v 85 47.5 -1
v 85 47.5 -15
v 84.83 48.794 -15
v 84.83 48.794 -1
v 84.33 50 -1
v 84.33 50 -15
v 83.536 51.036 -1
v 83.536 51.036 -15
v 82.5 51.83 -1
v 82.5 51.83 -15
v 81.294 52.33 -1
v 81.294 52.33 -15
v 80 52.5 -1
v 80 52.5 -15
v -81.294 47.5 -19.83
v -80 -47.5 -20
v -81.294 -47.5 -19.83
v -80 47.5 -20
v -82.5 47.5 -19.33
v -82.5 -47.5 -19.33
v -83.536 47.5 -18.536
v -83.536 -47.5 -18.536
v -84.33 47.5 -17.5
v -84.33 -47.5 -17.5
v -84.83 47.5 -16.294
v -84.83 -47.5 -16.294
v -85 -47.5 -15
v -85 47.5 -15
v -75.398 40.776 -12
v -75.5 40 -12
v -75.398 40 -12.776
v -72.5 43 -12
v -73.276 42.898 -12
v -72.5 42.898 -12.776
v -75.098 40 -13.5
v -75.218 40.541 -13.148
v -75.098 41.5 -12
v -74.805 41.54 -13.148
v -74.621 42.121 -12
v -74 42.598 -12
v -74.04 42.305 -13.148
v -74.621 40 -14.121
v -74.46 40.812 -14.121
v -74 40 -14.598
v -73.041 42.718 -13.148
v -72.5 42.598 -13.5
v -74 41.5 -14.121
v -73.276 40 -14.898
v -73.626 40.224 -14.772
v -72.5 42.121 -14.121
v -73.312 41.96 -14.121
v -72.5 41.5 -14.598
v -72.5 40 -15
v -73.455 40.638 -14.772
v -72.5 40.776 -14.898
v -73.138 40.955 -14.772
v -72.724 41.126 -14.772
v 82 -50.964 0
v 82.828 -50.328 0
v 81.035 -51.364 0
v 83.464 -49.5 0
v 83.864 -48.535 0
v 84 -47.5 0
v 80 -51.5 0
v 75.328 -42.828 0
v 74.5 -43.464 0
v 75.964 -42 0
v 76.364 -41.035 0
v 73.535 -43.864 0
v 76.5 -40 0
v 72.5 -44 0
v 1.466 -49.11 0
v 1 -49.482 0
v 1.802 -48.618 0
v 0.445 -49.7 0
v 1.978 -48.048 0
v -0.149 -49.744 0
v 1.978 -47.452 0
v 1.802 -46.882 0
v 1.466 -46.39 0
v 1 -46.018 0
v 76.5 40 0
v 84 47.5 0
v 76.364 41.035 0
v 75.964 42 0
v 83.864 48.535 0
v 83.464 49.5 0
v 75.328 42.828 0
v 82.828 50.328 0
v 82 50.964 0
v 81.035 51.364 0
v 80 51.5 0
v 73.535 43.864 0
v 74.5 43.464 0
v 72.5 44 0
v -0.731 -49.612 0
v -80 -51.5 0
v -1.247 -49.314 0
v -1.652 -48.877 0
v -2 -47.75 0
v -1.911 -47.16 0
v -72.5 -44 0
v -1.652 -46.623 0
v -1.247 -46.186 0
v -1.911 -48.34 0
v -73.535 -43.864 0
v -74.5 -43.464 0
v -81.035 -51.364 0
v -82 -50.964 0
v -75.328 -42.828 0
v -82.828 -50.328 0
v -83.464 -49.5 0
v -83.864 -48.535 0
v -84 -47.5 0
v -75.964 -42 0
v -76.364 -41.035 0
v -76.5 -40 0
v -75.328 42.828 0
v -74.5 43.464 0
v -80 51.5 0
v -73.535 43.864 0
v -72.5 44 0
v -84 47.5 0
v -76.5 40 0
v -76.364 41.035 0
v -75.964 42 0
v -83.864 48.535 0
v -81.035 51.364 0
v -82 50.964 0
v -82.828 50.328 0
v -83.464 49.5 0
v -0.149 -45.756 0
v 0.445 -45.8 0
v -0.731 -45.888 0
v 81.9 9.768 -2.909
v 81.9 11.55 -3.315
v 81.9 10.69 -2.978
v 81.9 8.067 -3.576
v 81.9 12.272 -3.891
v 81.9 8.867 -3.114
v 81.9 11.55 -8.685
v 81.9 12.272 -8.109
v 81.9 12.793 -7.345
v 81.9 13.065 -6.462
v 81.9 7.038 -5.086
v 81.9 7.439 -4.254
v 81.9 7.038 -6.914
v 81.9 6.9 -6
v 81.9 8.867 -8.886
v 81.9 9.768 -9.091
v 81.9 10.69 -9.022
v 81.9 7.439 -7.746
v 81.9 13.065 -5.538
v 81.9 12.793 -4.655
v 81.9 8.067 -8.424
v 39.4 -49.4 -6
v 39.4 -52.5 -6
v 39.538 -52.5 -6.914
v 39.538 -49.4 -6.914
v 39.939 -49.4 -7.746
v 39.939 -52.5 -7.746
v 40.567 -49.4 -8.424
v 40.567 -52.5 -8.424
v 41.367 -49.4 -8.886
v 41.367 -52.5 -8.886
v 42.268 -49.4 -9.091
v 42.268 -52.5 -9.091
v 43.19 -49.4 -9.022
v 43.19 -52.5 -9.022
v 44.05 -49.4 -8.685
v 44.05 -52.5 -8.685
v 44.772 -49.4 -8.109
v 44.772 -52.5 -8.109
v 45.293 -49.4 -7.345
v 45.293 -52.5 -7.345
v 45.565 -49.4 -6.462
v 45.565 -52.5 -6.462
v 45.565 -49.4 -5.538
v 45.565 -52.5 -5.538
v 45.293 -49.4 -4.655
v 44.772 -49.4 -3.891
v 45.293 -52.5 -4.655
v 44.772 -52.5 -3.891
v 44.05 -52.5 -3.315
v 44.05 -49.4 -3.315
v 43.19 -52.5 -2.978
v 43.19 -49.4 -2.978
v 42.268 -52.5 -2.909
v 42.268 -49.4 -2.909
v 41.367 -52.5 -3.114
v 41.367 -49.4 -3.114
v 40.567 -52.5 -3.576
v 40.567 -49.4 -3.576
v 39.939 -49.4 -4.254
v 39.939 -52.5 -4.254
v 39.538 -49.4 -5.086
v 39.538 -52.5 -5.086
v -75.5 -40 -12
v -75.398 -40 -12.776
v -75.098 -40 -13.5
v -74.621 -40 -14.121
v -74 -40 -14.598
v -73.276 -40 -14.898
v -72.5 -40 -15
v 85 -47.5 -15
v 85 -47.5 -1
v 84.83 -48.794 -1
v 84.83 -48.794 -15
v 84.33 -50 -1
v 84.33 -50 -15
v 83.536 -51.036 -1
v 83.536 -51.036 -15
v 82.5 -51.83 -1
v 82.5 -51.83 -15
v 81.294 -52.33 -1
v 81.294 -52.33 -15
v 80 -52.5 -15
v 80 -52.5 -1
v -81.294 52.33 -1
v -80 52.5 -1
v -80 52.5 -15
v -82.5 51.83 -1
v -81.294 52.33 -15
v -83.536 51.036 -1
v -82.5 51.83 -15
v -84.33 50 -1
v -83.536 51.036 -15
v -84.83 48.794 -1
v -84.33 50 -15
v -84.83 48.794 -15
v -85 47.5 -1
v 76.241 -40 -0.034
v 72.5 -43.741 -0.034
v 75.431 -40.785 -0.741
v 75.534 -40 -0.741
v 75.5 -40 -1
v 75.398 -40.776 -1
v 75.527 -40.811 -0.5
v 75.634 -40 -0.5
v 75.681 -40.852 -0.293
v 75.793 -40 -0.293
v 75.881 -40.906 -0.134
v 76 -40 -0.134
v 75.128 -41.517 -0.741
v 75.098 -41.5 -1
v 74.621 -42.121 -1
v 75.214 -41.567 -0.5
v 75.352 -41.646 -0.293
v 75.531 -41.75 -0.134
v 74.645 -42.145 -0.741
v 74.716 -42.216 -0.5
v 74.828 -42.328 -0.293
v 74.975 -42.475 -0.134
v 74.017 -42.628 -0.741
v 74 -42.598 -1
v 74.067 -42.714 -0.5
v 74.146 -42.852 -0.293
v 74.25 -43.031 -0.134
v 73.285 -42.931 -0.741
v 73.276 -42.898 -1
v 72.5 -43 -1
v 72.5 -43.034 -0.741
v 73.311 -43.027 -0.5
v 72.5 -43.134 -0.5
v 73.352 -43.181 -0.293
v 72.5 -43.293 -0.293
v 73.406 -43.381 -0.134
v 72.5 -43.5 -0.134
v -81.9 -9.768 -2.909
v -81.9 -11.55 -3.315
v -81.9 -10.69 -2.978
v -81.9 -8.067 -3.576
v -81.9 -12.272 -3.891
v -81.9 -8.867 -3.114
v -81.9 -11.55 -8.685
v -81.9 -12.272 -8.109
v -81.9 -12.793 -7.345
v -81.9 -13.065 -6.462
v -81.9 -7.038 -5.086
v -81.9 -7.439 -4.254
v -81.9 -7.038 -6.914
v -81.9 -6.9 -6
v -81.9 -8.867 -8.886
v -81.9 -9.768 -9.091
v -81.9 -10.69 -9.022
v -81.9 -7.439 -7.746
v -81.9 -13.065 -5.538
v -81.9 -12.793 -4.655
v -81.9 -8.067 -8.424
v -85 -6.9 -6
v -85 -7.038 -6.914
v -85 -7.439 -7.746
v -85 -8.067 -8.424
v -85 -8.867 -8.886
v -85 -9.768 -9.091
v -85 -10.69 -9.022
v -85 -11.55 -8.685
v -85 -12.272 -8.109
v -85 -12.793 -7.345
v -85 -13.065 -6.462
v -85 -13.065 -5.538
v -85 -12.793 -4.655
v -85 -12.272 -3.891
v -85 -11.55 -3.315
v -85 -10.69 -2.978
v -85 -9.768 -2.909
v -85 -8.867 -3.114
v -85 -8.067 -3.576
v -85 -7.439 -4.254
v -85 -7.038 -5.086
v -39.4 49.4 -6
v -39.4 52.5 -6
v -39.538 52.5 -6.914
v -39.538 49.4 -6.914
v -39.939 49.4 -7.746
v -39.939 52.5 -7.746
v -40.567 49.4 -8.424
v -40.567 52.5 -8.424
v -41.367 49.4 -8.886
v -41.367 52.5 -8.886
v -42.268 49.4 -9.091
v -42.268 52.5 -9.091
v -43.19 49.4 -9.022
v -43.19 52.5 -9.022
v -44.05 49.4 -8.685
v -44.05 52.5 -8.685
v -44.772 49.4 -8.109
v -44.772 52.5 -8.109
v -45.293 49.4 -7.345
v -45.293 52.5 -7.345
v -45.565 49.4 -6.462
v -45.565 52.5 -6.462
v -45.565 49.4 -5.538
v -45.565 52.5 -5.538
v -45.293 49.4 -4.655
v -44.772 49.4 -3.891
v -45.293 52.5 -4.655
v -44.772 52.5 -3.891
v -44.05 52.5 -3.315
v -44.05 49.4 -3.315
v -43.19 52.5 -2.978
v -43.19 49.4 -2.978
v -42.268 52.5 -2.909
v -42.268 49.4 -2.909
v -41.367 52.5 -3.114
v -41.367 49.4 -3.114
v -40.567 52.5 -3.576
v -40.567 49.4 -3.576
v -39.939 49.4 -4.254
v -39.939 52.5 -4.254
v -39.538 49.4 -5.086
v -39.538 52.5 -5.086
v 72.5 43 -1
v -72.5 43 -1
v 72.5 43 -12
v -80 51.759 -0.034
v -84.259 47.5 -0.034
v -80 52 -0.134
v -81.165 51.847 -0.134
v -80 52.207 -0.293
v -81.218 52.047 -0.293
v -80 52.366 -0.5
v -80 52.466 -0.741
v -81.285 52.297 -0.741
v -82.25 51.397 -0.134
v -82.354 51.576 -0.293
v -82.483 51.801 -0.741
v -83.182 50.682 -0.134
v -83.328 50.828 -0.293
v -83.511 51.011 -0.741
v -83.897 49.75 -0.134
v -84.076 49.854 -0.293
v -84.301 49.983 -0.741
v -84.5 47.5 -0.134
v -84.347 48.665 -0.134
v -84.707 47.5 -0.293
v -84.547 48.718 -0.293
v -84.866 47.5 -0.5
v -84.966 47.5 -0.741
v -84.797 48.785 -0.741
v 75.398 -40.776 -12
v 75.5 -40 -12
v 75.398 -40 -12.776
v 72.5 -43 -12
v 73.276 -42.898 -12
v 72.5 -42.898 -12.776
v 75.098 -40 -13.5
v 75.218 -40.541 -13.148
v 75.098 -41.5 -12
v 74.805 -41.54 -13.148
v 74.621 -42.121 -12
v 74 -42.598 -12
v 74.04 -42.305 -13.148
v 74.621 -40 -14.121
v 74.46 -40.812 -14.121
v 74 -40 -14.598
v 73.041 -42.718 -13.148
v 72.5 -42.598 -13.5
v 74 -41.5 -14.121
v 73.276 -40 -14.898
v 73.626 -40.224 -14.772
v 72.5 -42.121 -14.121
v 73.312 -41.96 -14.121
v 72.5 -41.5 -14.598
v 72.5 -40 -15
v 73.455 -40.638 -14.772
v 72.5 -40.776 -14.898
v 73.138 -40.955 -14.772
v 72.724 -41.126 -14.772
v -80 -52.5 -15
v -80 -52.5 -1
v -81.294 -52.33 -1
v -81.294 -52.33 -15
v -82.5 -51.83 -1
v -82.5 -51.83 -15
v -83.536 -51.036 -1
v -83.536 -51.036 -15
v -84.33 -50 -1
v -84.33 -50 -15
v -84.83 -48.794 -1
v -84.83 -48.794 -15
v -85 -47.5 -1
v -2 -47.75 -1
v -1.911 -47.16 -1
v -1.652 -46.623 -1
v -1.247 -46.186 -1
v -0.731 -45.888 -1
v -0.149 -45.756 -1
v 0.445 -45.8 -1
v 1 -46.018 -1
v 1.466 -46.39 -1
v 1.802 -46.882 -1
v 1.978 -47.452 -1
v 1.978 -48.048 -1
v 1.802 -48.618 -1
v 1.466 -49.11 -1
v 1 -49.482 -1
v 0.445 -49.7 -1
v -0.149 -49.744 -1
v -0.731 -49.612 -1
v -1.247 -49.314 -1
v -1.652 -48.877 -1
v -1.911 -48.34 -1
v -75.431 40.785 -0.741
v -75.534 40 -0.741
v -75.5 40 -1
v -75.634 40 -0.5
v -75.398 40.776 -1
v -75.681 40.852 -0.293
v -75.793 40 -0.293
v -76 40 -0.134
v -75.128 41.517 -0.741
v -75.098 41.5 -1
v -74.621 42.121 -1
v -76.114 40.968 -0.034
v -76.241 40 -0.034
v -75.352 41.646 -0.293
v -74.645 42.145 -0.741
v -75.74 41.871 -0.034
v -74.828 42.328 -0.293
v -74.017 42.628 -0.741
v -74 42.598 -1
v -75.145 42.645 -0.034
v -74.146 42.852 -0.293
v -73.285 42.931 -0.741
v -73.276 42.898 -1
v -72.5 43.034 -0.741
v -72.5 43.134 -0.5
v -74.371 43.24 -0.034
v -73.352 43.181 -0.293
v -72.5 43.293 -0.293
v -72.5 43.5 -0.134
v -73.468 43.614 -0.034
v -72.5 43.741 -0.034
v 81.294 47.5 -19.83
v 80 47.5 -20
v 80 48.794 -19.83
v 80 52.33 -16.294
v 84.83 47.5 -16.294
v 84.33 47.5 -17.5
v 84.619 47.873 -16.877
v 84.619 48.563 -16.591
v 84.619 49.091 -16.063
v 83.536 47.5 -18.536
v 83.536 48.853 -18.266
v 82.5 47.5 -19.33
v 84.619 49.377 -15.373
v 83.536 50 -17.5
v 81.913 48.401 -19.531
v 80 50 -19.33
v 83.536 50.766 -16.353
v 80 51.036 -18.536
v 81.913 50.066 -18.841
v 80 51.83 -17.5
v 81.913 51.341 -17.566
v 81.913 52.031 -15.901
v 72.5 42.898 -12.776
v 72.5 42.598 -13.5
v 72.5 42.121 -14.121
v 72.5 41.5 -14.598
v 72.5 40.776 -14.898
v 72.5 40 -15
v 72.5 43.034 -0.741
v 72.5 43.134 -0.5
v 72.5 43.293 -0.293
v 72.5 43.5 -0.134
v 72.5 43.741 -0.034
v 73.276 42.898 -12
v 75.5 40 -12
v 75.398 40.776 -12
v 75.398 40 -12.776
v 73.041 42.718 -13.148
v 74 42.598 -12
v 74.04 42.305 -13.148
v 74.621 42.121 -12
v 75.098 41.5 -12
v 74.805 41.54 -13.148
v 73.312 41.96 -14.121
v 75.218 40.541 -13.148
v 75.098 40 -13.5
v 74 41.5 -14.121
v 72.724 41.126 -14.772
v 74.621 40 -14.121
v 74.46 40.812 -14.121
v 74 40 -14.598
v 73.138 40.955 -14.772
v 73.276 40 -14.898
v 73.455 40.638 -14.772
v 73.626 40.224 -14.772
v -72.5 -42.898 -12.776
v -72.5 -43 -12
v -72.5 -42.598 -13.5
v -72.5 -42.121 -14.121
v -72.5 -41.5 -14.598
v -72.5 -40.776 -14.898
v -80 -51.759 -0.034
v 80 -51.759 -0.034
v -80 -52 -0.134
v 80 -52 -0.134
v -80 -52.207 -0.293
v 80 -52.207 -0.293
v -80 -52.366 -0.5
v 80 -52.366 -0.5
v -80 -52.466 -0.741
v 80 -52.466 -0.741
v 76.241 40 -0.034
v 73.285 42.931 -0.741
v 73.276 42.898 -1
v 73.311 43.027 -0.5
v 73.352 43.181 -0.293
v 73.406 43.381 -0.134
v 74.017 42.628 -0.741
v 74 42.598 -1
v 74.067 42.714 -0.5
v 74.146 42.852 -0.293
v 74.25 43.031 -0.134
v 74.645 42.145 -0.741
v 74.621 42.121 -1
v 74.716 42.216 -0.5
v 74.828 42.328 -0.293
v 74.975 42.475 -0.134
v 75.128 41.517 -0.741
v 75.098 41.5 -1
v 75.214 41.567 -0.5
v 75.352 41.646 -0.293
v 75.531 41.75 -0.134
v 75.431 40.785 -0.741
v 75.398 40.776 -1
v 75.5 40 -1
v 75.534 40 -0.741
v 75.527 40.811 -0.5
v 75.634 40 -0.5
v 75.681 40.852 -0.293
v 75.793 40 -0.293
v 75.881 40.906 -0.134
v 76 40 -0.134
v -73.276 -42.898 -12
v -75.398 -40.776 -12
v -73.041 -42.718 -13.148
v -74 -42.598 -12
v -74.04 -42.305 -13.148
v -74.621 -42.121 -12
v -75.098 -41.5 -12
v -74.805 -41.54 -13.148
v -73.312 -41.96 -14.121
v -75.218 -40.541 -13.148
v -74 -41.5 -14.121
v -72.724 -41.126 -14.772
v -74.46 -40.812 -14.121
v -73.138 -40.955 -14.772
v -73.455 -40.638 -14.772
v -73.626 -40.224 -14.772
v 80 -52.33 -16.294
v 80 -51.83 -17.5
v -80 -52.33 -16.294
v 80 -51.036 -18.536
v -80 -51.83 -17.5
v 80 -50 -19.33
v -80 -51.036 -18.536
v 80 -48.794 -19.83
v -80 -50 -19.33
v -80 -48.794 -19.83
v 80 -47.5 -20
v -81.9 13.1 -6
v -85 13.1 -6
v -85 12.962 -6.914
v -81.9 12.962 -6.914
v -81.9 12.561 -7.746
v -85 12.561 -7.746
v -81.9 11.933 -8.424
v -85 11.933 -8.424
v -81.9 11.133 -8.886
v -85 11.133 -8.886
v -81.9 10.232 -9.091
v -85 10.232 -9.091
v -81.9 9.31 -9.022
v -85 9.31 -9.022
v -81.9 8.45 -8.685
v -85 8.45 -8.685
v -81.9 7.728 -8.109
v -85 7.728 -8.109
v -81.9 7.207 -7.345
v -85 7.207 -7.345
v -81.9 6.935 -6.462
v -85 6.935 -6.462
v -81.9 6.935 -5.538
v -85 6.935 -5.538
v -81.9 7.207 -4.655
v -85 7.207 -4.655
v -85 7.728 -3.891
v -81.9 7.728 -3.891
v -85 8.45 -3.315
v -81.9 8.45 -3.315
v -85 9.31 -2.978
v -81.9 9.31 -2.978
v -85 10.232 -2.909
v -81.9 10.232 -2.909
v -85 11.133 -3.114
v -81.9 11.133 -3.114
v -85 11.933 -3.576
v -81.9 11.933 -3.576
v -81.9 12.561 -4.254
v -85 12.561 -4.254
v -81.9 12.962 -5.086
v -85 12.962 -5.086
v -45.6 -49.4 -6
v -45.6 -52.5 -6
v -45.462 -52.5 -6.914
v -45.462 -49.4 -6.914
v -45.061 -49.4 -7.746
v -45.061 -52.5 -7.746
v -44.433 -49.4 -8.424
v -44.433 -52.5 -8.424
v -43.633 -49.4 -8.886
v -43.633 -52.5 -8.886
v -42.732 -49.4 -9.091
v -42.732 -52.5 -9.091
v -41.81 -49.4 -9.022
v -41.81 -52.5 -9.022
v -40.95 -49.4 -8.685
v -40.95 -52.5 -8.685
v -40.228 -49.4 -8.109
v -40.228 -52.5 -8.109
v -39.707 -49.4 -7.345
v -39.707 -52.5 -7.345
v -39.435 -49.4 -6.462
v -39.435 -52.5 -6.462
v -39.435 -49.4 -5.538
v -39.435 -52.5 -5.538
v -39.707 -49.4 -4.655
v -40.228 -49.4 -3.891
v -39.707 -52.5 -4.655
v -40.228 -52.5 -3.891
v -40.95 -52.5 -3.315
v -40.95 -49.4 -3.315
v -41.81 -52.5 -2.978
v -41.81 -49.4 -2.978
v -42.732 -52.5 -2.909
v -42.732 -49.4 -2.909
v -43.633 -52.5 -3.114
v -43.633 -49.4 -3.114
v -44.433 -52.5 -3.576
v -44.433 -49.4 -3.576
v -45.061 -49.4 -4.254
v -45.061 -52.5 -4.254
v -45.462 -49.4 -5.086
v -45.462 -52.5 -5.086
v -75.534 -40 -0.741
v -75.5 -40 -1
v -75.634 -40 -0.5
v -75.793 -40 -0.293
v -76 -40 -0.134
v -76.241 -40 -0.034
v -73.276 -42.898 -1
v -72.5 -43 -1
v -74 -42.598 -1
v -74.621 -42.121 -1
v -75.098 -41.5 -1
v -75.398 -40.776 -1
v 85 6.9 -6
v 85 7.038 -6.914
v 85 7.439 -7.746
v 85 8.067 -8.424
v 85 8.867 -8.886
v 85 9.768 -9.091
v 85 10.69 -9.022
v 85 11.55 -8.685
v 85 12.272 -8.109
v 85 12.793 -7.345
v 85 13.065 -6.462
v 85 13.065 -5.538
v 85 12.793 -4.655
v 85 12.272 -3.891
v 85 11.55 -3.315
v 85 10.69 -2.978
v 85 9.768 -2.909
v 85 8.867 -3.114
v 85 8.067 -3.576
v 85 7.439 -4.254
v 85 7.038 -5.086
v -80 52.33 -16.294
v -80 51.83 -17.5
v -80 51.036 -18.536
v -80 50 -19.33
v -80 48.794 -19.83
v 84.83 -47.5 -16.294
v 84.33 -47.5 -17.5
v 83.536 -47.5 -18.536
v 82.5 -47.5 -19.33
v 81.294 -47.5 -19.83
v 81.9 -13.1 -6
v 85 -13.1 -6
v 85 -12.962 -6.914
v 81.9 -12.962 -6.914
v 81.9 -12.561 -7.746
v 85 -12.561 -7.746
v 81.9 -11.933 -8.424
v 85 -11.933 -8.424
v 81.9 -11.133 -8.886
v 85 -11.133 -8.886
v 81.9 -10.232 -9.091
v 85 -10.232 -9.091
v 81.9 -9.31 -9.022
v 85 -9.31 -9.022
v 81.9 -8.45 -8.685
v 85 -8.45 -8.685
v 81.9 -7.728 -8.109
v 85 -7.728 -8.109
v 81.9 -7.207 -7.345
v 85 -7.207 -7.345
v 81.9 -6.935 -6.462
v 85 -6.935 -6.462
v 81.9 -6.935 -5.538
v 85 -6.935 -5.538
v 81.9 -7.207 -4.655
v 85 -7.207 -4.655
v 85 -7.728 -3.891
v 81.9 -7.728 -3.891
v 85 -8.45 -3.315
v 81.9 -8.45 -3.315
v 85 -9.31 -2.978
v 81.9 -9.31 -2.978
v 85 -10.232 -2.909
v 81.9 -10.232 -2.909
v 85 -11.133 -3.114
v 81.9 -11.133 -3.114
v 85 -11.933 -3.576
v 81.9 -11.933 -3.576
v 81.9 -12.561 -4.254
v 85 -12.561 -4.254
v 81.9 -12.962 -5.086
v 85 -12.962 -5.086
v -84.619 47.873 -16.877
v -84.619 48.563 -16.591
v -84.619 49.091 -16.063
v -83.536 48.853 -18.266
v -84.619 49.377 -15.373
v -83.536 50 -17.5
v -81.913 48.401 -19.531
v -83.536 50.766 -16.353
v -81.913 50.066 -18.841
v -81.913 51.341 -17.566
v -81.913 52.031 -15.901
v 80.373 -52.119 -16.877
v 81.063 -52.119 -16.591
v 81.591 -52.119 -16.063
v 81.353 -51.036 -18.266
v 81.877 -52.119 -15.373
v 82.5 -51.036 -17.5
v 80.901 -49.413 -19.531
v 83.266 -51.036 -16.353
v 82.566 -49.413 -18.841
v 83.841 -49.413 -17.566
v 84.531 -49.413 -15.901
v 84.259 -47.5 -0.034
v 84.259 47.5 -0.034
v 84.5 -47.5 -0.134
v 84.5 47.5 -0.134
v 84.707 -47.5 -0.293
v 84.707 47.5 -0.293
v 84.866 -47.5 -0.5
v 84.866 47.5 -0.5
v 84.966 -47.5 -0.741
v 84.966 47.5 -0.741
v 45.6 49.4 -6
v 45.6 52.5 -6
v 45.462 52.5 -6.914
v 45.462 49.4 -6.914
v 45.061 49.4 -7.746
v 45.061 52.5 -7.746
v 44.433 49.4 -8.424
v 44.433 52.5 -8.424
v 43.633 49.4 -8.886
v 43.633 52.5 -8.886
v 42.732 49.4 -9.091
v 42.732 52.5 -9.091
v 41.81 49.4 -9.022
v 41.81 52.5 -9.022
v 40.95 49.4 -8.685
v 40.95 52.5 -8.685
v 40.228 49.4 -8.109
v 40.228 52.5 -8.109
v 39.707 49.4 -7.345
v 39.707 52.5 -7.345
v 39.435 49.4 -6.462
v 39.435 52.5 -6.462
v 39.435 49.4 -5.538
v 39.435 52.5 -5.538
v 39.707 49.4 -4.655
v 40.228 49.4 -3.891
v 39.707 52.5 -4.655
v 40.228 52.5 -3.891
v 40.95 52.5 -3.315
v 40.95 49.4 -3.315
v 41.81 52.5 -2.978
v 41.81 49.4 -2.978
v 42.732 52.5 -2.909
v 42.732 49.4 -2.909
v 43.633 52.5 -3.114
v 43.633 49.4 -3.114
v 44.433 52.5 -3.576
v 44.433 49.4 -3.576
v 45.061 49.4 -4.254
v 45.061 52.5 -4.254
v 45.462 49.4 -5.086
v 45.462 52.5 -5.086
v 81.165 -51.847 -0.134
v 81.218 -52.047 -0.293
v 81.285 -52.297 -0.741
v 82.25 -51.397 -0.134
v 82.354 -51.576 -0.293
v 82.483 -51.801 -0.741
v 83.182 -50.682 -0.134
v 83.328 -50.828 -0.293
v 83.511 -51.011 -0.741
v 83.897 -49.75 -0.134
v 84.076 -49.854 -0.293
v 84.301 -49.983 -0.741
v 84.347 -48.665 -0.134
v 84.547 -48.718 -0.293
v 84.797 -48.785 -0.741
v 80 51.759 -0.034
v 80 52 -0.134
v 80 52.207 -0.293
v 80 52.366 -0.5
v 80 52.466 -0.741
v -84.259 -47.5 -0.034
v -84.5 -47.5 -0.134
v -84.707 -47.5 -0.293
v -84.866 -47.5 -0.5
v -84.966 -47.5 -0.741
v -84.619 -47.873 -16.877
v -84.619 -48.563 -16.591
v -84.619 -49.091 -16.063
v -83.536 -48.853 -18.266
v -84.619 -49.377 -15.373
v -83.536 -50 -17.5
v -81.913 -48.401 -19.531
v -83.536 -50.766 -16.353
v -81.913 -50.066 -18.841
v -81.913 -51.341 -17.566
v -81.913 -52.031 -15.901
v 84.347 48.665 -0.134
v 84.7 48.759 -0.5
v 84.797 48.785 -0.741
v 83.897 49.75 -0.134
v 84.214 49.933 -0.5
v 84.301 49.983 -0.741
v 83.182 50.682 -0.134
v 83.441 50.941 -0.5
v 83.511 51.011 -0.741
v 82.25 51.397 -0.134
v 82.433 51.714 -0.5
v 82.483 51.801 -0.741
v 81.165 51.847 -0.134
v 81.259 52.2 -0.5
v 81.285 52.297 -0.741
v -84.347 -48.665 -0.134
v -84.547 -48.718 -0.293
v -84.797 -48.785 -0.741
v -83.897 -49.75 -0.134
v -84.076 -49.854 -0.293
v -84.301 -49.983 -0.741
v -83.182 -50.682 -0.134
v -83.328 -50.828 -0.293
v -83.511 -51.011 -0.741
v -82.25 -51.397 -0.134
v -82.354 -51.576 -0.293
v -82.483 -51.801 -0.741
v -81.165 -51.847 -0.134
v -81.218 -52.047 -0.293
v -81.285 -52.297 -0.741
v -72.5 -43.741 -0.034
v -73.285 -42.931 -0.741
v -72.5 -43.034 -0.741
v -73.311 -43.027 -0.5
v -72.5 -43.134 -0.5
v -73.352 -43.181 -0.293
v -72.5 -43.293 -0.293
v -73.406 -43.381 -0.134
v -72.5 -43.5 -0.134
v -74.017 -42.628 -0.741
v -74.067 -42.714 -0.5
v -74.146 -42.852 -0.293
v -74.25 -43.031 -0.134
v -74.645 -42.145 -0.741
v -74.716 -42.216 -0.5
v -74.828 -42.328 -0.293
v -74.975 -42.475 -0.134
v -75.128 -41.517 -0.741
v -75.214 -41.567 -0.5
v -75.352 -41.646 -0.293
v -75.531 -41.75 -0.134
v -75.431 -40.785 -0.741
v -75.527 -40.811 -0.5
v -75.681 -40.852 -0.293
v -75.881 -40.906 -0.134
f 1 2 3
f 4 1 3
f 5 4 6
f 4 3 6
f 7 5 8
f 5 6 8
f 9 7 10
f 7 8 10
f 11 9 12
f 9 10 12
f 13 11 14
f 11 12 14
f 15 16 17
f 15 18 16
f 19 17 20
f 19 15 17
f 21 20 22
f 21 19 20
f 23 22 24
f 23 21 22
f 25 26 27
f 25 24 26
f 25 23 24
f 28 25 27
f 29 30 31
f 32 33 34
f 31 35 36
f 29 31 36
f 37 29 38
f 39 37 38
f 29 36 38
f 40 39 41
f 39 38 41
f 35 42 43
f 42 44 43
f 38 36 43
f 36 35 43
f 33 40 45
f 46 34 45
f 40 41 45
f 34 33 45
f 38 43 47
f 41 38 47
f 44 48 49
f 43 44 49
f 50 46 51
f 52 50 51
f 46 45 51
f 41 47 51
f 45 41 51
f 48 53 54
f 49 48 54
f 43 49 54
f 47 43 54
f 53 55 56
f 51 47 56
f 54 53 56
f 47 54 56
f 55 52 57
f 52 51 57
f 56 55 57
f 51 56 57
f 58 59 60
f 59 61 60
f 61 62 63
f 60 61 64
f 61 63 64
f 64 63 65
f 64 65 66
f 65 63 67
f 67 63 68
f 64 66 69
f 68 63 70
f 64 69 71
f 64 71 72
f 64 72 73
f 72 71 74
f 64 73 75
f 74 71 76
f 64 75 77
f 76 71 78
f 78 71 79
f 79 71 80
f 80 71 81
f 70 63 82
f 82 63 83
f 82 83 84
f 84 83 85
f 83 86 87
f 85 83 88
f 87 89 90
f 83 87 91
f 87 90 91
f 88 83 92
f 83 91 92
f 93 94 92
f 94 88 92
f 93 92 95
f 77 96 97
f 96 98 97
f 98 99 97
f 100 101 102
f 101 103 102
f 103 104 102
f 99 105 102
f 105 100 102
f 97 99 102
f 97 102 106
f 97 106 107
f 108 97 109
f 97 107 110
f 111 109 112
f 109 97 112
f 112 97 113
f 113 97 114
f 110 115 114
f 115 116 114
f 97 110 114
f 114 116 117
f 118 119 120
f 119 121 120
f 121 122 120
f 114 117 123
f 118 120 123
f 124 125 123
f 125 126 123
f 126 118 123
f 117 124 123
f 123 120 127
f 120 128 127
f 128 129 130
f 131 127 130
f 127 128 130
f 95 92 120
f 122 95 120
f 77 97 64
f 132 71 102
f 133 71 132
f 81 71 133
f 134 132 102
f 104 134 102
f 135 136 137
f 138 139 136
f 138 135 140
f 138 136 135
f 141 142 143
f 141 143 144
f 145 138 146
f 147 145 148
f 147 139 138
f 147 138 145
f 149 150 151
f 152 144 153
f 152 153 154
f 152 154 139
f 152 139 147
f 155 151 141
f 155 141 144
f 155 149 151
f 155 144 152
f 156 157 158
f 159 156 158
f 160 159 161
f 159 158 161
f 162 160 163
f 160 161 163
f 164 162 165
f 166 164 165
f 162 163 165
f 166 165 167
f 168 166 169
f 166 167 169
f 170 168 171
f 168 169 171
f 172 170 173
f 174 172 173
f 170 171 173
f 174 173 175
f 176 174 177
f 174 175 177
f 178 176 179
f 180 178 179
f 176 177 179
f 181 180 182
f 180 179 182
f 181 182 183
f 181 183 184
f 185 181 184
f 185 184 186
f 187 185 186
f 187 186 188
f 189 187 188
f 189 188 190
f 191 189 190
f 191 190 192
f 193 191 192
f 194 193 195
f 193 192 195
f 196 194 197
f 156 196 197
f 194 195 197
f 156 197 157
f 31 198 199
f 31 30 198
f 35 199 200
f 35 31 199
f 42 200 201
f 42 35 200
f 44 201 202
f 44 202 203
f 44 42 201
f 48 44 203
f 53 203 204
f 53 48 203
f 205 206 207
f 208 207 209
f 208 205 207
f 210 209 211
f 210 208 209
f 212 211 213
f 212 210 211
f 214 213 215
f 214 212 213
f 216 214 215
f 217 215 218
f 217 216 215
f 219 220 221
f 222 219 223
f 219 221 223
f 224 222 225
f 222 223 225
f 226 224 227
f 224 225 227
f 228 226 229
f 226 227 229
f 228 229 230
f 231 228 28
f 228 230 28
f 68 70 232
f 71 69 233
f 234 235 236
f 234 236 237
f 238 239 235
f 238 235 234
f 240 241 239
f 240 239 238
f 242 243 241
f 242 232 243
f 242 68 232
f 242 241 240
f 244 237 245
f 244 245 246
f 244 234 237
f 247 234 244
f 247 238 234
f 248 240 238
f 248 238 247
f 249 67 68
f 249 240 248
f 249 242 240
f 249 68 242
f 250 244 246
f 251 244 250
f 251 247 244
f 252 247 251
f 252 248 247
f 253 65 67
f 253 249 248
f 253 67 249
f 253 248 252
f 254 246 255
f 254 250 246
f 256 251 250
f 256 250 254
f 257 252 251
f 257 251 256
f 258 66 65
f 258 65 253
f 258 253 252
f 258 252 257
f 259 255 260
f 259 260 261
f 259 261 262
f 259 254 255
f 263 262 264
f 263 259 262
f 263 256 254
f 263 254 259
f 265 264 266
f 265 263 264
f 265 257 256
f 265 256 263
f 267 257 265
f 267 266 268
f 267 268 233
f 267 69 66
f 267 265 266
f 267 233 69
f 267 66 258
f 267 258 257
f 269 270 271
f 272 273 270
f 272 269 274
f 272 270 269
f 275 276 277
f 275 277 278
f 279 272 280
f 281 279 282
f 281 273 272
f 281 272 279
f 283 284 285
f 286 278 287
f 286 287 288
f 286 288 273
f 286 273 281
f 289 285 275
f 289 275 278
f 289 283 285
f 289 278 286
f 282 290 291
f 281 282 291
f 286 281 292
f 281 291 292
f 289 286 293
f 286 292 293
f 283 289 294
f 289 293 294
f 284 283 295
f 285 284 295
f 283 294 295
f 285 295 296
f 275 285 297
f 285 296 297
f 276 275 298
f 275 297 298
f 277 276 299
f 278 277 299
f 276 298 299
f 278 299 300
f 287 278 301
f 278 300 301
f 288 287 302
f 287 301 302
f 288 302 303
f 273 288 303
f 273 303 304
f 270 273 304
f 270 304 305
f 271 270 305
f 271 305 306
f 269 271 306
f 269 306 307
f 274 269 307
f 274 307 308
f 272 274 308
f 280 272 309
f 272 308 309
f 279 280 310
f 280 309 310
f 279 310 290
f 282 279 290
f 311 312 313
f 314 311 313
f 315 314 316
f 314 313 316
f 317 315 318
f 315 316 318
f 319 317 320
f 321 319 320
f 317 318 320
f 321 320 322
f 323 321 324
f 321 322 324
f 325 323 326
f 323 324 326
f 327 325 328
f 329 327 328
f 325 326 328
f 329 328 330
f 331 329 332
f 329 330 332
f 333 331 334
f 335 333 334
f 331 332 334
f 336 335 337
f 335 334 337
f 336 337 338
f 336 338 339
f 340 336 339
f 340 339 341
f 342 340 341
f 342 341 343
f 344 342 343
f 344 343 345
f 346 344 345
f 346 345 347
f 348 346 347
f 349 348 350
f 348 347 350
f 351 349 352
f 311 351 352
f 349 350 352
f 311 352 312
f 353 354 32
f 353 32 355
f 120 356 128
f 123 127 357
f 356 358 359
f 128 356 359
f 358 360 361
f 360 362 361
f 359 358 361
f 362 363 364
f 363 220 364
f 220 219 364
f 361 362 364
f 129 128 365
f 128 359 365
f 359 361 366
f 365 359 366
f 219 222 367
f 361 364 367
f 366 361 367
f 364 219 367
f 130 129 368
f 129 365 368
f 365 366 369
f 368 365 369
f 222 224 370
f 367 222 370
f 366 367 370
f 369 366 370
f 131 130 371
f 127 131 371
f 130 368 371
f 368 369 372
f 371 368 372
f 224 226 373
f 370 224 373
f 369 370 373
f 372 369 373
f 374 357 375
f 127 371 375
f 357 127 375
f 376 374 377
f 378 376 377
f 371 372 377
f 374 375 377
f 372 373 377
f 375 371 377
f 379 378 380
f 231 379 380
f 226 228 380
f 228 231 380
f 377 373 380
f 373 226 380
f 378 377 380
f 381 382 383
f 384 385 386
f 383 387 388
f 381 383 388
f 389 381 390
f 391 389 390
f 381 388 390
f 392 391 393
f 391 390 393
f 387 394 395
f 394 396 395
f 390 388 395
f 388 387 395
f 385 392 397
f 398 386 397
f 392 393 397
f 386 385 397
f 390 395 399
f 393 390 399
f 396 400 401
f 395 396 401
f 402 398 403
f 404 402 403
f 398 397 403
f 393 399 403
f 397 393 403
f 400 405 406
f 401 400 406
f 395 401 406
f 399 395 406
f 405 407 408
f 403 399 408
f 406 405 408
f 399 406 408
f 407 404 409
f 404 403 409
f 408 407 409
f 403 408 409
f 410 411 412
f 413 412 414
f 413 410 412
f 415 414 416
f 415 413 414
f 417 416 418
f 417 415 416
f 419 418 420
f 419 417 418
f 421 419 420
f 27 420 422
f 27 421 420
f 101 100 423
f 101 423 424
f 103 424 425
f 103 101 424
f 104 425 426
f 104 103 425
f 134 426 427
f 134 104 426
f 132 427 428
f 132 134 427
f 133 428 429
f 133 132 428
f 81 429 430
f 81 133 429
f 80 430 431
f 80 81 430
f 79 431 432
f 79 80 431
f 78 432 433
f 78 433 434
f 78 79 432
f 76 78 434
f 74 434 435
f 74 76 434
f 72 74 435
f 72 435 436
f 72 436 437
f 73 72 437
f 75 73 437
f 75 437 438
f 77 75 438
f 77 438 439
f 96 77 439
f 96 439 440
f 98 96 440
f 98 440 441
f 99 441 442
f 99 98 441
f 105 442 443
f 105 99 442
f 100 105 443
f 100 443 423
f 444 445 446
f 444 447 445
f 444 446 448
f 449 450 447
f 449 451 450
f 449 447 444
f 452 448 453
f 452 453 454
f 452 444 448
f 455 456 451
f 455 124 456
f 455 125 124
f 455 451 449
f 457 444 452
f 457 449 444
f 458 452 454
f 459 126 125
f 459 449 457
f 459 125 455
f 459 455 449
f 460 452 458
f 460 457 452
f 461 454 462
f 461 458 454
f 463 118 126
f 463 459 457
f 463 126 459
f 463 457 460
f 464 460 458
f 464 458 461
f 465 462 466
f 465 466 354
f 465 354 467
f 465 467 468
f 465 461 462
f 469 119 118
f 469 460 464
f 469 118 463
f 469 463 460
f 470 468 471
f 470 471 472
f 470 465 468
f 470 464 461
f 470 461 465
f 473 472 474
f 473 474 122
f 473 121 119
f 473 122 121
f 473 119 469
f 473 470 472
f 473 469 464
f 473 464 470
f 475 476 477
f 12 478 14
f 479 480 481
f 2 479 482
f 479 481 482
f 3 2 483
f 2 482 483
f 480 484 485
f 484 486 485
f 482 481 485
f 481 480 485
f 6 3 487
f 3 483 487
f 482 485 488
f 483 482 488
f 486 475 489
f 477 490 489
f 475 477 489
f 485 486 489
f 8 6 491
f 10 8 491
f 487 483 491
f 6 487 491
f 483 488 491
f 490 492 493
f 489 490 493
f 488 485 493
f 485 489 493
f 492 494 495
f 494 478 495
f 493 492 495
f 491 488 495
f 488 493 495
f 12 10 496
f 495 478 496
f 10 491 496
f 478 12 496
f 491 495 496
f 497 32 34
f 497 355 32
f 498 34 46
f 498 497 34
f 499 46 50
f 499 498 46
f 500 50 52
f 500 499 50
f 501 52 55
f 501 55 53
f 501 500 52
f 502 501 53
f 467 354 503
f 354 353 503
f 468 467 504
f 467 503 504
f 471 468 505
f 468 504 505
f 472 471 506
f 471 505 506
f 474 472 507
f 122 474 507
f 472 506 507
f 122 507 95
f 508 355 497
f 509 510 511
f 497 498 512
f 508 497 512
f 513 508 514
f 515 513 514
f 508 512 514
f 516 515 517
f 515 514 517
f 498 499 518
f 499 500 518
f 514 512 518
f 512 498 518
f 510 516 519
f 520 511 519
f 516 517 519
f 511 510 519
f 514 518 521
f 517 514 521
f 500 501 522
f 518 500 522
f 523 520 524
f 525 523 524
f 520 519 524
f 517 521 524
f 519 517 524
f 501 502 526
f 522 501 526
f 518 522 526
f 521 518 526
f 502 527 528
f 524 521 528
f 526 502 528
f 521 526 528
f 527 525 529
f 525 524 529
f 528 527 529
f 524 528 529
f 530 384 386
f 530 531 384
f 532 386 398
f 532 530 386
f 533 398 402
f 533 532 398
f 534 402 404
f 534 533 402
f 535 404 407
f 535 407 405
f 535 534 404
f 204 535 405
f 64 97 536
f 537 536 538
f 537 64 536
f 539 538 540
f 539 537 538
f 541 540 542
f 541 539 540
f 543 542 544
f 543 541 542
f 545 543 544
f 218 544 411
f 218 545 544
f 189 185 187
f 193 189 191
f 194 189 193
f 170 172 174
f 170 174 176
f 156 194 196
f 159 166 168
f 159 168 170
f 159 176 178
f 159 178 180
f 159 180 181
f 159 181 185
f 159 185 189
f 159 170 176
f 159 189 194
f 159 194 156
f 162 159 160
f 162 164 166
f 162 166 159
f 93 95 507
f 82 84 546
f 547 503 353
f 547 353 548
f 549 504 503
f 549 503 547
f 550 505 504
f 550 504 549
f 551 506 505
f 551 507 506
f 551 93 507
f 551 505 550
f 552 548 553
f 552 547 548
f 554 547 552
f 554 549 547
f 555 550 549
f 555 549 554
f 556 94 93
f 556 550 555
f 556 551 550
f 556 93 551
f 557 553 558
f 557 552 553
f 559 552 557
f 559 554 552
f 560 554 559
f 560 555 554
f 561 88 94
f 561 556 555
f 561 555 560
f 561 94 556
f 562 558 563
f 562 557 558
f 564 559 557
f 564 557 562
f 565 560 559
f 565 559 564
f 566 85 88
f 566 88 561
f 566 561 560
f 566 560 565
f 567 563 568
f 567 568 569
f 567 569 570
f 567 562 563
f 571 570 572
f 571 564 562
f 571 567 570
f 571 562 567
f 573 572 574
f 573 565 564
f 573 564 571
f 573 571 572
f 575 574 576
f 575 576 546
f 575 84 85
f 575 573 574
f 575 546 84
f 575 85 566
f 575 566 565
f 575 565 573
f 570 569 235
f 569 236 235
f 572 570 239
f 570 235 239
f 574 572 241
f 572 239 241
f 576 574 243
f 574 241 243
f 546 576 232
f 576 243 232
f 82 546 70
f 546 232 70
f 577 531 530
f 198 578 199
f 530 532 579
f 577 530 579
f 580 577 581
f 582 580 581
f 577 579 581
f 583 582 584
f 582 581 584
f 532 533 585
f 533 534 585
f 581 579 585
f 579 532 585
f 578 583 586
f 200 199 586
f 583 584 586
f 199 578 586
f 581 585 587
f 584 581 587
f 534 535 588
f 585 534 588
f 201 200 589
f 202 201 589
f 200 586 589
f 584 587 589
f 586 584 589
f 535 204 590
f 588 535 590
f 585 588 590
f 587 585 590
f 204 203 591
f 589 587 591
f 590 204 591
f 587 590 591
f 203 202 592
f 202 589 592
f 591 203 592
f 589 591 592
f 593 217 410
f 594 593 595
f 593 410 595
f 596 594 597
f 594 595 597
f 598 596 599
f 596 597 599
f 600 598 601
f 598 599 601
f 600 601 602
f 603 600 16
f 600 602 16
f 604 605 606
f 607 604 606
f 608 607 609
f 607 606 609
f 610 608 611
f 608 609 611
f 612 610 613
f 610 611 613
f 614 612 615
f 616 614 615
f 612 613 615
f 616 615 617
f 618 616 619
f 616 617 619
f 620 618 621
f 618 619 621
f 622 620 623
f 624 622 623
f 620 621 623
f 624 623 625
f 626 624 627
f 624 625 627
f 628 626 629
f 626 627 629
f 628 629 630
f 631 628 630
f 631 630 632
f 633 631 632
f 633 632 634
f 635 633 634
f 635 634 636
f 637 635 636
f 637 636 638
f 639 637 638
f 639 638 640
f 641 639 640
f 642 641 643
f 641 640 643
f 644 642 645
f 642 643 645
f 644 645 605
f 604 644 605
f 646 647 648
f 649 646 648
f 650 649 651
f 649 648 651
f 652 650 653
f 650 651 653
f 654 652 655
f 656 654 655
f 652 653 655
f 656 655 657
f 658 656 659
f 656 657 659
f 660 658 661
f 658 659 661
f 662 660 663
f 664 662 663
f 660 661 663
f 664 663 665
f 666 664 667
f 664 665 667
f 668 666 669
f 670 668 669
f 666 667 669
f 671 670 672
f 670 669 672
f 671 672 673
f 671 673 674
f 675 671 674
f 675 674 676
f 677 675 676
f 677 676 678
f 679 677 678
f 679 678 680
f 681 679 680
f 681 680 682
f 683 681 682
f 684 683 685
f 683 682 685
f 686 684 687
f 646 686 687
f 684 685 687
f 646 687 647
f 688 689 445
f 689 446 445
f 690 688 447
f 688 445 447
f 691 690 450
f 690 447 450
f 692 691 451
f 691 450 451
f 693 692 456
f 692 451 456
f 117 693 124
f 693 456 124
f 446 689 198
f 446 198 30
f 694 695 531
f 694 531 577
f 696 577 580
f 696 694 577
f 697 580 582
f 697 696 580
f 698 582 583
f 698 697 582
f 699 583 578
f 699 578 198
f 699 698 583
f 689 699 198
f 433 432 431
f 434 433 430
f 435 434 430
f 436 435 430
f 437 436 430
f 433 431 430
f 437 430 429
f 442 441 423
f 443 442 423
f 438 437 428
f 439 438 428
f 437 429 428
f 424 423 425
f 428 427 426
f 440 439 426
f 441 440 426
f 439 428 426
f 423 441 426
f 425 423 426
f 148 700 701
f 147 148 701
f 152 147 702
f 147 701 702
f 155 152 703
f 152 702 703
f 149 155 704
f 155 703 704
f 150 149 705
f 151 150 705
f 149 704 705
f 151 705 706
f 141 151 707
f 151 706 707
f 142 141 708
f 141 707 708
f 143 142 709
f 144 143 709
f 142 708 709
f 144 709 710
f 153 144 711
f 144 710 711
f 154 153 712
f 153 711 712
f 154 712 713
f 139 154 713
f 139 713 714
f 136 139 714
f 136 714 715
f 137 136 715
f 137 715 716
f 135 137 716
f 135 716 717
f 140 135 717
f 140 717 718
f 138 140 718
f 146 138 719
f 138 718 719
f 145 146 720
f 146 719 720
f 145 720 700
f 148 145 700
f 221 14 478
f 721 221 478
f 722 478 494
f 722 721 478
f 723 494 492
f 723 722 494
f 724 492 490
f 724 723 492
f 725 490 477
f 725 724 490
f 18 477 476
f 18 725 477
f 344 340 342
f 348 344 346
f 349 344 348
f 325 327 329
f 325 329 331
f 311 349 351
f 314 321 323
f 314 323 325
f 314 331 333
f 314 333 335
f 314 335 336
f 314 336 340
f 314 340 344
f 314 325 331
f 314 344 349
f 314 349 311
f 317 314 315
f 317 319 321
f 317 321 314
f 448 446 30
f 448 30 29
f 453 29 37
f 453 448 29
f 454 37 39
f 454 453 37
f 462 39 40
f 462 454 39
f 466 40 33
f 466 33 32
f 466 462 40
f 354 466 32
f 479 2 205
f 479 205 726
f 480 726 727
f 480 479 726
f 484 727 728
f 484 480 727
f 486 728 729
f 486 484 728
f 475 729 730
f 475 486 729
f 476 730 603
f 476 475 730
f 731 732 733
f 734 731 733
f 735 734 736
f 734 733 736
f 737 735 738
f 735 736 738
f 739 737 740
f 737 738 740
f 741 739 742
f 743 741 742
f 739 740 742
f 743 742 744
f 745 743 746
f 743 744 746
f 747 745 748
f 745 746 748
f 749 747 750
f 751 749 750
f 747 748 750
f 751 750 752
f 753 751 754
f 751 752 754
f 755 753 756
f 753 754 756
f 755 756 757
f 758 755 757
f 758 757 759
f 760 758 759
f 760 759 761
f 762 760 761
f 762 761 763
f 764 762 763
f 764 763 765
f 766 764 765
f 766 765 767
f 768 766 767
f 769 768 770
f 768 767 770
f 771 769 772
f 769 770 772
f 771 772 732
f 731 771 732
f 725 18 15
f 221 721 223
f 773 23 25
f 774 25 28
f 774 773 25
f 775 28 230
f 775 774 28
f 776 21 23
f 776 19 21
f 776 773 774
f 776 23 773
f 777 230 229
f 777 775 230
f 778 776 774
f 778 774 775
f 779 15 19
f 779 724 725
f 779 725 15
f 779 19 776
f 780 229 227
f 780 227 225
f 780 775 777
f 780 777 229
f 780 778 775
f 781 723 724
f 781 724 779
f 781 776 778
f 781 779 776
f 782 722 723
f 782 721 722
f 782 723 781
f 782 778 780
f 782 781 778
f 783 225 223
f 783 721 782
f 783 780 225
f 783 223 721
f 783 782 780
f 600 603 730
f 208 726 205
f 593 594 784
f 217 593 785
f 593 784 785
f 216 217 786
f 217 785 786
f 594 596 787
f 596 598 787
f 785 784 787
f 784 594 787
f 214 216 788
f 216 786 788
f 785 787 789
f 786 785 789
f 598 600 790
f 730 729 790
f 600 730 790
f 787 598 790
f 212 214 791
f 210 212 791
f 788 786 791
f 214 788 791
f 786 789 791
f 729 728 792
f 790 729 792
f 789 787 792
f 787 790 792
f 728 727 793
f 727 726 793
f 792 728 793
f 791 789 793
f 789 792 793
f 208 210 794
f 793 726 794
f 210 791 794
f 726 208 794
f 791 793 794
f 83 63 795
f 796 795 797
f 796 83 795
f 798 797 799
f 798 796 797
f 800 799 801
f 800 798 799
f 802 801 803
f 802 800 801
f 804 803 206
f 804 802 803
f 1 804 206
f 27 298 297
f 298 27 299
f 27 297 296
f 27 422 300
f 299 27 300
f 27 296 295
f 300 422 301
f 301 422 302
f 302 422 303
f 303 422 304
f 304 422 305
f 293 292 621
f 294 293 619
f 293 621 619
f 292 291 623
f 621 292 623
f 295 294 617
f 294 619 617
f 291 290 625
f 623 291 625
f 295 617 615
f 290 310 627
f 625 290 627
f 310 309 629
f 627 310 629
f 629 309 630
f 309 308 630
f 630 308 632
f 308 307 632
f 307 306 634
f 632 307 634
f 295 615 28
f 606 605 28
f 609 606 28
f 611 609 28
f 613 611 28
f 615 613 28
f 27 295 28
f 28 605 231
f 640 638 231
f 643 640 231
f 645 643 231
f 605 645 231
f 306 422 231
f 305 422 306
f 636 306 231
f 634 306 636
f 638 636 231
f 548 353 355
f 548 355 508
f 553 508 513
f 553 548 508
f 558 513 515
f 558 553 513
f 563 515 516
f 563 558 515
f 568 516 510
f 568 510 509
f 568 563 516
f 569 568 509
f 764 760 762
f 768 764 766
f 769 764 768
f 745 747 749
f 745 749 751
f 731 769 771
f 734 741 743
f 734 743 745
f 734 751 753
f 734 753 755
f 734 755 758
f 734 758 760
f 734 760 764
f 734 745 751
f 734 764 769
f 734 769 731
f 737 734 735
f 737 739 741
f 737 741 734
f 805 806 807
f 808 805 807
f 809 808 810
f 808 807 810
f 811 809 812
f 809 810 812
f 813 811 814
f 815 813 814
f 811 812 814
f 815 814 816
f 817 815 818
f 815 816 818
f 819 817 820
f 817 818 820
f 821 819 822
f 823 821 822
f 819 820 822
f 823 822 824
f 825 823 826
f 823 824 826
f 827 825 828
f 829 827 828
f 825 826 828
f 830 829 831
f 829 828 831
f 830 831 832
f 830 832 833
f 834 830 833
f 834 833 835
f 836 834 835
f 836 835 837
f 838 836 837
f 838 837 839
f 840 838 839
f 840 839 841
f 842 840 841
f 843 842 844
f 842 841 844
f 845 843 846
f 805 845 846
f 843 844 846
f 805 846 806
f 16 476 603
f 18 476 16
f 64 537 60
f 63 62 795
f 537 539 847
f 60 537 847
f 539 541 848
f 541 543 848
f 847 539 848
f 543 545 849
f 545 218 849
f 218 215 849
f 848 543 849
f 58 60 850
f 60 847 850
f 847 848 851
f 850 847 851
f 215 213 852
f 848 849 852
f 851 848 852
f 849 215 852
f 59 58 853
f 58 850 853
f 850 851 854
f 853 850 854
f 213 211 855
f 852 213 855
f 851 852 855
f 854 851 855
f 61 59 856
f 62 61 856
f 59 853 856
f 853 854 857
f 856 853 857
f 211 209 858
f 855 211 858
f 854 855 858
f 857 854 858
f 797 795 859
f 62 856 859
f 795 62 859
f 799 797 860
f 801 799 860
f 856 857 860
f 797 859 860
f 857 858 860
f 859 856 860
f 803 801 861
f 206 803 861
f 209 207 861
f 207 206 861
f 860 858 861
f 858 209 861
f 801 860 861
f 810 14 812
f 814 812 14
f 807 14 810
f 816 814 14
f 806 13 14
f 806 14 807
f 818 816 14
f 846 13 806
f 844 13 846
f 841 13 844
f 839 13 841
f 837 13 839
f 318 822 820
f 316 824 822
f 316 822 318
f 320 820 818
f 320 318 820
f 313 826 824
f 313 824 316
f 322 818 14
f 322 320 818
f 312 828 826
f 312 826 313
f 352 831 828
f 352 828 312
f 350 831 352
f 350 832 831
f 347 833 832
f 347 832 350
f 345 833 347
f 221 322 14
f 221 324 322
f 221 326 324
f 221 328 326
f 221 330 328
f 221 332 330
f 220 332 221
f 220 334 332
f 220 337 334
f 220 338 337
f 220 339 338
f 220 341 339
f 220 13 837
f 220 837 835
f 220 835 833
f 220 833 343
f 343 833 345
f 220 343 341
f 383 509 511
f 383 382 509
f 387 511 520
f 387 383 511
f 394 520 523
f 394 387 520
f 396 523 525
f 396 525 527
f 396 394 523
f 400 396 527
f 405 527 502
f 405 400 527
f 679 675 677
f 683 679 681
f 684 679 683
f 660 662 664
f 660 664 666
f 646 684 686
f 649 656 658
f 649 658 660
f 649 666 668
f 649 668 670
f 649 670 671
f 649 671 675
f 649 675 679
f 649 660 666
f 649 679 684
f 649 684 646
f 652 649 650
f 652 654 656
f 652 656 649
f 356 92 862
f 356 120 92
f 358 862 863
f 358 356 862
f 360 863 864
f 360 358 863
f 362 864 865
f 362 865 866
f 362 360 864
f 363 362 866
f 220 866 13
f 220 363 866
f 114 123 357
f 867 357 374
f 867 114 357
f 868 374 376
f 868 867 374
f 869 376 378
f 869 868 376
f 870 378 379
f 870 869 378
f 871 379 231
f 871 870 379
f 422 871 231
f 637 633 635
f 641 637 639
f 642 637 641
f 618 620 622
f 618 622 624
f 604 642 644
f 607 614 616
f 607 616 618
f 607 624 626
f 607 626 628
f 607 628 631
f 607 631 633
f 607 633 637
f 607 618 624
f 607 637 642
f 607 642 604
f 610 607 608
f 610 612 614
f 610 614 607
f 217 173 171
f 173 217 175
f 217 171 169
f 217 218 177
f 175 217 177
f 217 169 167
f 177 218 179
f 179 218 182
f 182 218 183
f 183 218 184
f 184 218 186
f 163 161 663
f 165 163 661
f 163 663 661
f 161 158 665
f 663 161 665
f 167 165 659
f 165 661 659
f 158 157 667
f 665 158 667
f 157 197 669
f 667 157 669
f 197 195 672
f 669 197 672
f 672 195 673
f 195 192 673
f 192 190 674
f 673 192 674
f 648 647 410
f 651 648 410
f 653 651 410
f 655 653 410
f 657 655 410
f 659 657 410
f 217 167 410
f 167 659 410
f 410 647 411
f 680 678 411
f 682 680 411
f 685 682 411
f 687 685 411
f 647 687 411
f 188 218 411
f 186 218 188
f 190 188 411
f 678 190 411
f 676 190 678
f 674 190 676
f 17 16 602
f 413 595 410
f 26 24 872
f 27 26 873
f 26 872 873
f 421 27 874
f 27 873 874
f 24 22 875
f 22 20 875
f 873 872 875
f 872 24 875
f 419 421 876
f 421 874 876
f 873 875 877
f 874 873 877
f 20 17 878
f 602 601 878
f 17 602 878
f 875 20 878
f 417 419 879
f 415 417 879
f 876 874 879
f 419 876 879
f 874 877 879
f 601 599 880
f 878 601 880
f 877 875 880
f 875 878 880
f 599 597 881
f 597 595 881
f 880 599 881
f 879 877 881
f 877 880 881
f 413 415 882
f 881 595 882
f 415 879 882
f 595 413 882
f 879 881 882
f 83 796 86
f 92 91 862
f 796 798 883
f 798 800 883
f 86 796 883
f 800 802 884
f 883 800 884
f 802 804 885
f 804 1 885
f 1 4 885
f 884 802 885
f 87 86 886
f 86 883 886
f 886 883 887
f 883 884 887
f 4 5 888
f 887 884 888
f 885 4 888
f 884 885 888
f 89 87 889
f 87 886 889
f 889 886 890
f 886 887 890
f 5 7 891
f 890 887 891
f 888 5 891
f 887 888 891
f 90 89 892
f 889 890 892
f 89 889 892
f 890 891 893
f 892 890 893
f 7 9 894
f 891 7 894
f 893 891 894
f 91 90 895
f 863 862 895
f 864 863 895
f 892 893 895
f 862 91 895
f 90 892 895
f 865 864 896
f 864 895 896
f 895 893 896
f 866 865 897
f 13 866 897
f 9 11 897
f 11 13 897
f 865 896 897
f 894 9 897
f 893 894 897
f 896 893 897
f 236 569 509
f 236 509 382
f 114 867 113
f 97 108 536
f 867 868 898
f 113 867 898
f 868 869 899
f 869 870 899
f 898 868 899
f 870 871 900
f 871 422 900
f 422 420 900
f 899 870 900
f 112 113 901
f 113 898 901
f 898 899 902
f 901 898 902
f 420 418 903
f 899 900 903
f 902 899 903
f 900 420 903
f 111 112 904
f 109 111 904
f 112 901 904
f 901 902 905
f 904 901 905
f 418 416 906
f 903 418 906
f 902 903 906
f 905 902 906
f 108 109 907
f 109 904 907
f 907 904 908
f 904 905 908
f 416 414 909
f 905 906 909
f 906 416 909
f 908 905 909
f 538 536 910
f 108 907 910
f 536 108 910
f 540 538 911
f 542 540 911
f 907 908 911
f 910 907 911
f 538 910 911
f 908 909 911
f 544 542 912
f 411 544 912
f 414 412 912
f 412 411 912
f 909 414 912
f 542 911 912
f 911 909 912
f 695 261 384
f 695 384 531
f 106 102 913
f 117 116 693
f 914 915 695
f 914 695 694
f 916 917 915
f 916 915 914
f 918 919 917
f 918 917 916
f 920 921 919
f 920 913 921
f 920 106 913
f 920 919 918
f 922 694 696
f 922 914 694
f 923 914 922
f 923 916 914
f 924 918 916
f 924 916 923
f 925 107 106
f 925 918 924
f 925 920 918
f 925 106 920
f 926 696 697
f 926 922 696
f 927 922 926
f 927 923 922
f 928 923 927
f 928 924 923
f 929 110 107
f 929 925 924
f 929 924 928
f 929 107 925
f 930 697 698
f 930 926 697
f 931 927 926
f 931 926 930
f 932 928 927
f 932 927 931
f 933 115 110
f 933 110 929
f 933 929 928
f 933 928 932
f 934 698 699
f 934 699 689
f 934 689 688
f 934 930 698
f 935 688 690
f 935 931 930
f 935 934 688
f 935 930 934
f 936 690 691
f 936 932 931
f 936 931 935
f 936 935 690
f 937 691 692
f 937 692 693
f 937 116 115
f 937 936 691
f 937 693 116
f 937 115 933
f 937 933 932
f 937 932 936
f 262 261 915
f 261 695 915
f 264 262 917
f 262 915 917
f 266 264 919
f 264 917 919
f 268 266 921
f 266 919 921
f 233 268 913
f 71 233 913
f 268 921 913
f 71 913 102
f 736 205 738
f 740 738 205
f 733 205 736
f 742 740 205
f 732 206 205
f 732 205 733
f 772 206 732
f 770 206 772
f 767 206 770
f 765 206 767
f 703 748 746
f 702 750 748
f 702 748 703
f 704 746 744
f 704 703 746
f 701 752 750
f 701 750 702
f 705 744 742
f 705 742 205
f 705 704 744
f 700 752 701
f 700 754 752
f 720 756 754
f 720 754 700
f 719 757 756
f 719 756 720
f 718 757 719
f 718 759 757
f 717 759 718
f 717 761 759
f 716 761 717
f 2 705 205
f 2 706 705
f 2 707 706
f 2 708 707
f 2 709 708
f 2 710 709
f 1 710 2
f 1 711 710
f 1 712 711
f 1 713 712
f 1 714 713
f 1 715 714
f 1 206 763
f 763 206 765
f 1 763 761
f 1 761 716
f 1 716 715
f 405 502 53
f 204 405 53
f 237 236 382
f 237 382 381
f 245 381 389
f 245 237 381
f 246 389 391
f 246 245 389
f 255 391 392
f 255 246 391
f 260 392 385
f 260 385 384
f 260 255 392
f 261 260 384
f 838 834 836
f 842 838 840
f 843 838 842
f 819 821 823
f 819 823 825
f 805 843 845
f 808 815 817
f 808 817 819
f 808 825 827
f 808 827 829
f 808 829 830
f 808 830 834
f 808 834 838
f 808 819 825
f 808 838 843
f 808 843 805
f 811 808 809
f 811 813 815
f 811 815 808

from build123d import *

# Parameters (mm, degrees)
F0_W      = 170
F0_H      = 105
F0_R      = 2
F1_DEPTH  = 20
F2_DEPTH  = 15
F3_R      = 5
F4_R      = 3
F5_R      = 1
F6_R      = 3.1
F7_DEPTH  = 3.1
F8_R      = 3.1
F9_DEPTH  = 3.1
F10_R     = 3.1
F11_DEPTH = 3.1
F12_R     = 3.1
F13_DEPTH = 3.1
F14_DEPTH = 1
F15_ANGLE = 180


# Not quite as in the source:
# - a feature names something its author has since deleted; it is built from what else it names


with BuildPart() as f1:
    # F0 (on Top) → F1 (new body)
    with BuildSketch(Plane.XY):
        Rectangle(F0_W, F0_H)
        with Locations((0, -47.75)):
            Circle(F0_R, mode=Mode.SUBTRACT)
        with BuildLine():
            ThreePointArc((-75.5, 40), (-74.6213203436, 42.1213203436), (-72.5, 43))
            Line((-72.5, 43), (72.5, 43))
            ThreePointArc((72.5, 43), (74.6213203436, 42.1213203436), (75.5, 40))
            Line((75.5, 40), (75.5, -40))
            ThreePointArc((75.5, -40), (74.6213203436, -42.1213203436), (72.5, -43))
            Line((72.5, -43), (-72.5, -43))
            ThreePointArc((-72.5, -43), (-74.6213203436, -42.1213203436), (-75.5, -40))
            Line((-75.5, -40), (-75.5, 40))
        make_face(mode=Mode.SUBTRACT)
        with BuildLine():
            Line((72.5, 43), (-72.5, 43))
            ThreePointArc((-72.5, 43), (-74.6213203436, 42.1213203436), (-75.5, 40))
            Line((-75.5, 40), (-75.5, -40))
            ThreePointArc((-75.5, -40), (-74.6213203436, -42.1213203436), (-72.5, -43))
            Line((-72.5, -43), (72.5, -43))
            ThreePointArc((72.5, -43), (74.6213203436, -42.1213203436), (75.5, -40))
            Line((75.5, -40), (75.5, 40))
            ThreePointArc((75.5, 40), (74.6213203436, 42.1213203436), (72.5, 43))
        make_face()
        with Locations((0, -47.75)):
            Circle(F0_R)
    extrude(amount=F1_DEPTH)

    # F0 (on Top) → F2 (cut)
    with BuildSketch(Plane.XY):
        with BuildLine():
            Line((72.5, 43), (-72.5, 43))
            ThreePointArc((-72.5, 43), (-74.6213203436, 42.1213203436), (-75.5, 40))
            Line((-75.5, 40), (-75.5, -40))
            ThreePointArc((-75.5, -40), (-74.6213203436, -42.1213203436), (-72.5, -43))
            Line((-72.5, -43), (72.5, -43))
            ThreePointArc((72.5, -43), (74.6213203436, -42.1213203436), (75.5, -40))
            Line((75.5, -40), (75.5, 40))
            ThreePointArc((75.5, 40), (74.6213203436, 42.1213203436), (72.5, 43))
        make_face()
    extrude(amount=F2_DEPTH, mode=Mode.SUBTRACT)

    # F3
    f3_edges = [f1.edges().sort_by_distance(p)[0] for p in [
        (0, 52.5, 20),
        (-85, 0, 20),
        (0, -52.5, 20),
        (85, 0, 20),
        (85, 52.5, 10),
        (-85, 52.5, 10),
        (-85, -52.5, 10),
        (85, -52.5, 10),
    ]]
    fillet(f3_edges, radius=F3_R)

    # F4
    f4_edges = [f1.edges().sort_by_distance(p)[0] for p in [
        (0, 43, 15),
        (-74.62132, 42.12132, 15),
        (-75.5, 0, 15),
        (-74.62132, -42.12132, 15),
        (0, -43, 15),
        (74.62132, -42.12132, 15),
        (75.5, 0, 15),
        (74.62132, 42.12132, 15),
    ]]
    fillet(f4_edges, radius=F4_R)

    # F5
    f5_edges = [f1.edges().sort_by_distance(p)[0] for p in [
        (0, 52.5, 0),
        (83.535534, 51.035534, 0),
        (-83.535534, 51.035534, 0),
        (85, 0, 0),
        (-85, 0, 0),
        (83.535534, -51.035534, 0),
        (-83.535534, -51.035534, 0),
        (0, -52.5, 0),
        (0, 43, 0),
        (-74.62132, 42.12132, 0),
        (-75.5, 0, 0),
        (-74.62132, -42.12132, 0),
        (0, -43, 0),
        (74.62132, -42.12132, 0),
        (75.5, 0, 0),
        (74.62132, 42.12132, 0),
    ]]
    fillet(f5_edges, radius=F5_R)

    # F6 (on face) → F7 (cut)
    with BuildSketch(Plane.XZ.offset(52.5)):
        with Locations((42.5, 6)):
            Circle(F6_R)
        with Locations((-42.5, 6)):
            Circle(F6_R)
    extrude(amount=-F7_DEPTH, mode=Mode.SUBTRACT)

    # F8 (on face) → F9 (cut)
    with BuildSketch(Plane(origin=(0, 52.5, 0), x_dir=(-1, 0, 0), z_dir=(0, 1, 0))):
        with Locations((42.5, 6)):
            Circle(F8_R)
        with Locations((-42.5, 6)):
            Circle(F8_R)
    extrude(amount=-F9_DEPTH, mode=Mode.SUBTRACT)

    # F10 (on face) → F11 (cut)
    with BuildSketch(Plane(origin=(-85, 0, 0), x_dir=(0, -1, 0), z_dir=(-1, 0, 0))):
        with Locations((10, 6)):
            Circle(F10_R)
        with Locations((-10, 6)):
            Circle(F10_R)
    extrude(amount=-F11_DEPTH, mode=Mode.SUBTRACT)

    # F12 (on face) → F13 (cut)
    with BuildSketch(Plane.YZ.offset(85)):
        with Locations((10, 6)):
            Circle(F12_R)
        with Locations((-10, 6)):
            Circle(F12_R)
    extrude(amount=-F13_DEPTH, mode=Mode.SUBTRACT)

    # F0 (on Top) → F14 (cut)
    with BuildSketch(Plane.XY):
        with Locations((0, -47.75)):
            Circle(F0_R)
    extrude(amount=F14_DEPTH, mode=Mode.SUBTRACT)


with BuildPart() as f1_1:
    # F15: moved
    add(f1.part.rotate(Axis((0, 0, 0), (0, 1, 0)), F15_ANGLE))


solid = f1_1.part
